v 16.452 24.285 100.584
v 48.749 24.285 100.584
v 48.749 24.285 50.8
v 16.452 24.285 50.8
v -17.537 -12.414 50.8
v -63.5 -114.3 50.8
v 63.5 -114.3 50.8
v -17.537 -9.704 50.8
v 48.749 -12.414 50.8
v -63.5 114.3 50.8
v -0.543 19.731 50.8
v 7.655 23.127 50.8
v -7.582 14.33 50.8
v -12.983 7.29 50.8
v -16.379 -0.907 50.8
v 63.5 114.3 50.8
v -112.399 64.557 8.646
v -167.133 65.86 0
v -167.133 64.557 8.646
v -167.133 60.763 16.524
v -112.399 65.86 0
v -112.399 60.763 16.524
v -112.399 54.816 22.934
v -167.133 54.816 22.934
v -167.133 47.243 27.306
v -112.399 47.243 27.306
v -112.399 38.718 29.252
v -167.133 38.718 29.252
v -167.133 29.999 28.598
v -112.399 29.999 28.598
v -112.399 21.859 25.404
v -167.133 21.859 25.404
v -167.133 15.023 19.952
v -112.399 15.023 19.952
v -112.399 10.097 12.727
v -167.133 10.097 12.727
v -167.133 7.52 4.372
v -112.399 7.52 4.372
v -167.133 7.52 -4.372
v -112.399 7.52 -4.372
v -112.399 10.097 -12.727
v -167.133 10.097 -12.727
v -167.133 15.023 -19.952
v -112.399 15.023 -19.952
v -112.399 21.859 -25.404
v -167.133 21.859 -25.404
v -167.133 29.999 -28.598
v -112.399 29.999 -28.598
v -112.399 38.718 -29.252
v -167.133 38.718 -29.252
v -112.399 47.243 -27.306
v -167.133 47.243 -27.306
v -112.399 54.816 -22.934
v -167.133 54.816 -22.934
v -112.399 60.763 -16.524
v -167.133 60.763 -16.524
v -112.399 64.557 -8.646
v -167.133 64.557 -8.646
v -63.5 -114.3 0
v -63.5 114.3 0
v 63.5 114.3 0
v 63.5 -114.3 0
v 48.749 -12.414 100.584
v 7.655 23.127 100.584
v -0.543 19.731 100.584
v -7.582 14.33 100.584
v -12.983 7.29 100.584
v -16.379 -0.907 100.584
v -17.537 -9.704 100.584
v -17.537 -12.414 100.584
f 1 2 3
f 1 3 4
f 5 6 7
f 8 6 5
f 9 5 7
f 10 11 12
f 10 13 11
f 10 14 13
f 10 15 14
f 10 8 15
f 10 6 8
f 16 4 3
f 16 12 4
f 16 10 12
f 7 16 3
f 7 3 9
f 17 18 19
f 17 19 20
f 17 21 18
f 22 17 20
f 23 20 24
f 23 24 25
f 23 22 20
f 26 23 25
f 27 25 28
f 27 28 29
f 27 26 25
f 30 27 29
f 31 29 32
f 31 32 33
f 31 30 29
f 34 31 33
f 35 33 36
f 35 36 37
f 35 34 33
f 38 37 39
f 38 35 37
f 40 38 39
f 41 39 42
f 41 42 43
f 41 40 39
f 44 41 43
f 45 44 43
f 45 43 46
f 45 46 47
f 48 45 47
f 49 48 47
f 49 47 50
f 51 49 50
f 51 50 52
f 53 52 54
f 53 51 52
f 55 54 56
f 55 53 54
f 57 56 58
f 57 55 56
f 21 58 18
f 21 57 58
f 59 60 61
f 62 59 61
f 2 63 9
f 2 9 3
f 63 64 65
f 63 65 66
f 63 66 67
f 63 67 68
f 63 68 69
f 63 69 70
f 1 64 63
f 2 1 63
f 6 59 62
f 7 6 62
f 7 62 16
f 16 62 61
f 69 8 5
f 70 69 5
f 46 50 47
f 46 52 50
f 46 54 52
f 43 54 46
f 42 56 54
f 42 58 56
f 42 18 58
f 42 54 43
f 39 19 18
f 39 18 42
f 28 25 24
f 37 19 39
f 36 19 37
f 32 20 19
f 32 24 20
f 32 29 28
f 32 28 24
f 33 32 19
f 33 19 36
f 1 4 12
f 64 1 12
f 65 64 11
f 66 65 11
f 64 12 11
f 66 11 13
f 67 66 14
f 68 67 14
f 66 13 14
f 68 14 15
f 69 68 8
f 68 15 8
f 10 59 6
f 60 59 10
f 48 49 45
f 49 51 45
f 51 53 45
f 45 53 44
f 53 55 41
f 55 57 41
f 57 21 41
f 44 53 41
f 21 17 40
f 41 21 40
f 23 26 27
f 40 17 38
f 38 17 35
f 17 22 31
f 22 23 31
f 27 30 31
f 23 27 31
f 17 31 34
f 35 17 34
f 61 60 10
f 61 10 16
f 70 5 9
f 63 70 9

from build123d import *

# Parameters (mm, degrees)
F0_W     = 127
F0_H     = 228.6
F1_DEPTH = 50.8
F2_W     = 29.3338634074
F2_H     = 29.3338634074
F4_DEPTH = 25.4
F6_DEPTH = 49.784


with BuildPart() as f1:
    # F0 (on Top) → F1 (new body)
    with BuildSketch(Plane.XY):
        Rectangle(F0_W, F0_H)
    extrude(amount=F1_DEPTH)

    # F5 (on face) → F6 (join)
    with BuildSketch(Plane.XY.offset(50.8)):
        with BuildLine():
            Line((48.7492531538, 24.2847409099), (16.4515623851, 24.2847409099))
            ThreePointArc((16.4515623851, 24.2847409099), (-7.5820488068, 14.3296932014), (-17.5370965153, -9.7039179905))
            Line((-17.5370965153, -9.7039179905), (-17.5370965153, -12.4137345701))
            Line((-17.5370965153, -12.4137345701), (48.7492531538, -12.4137345701))
            Line((48.7492531538, -12.4137345701), (48.7492531538, 24.2847409099))
        make_face()
    extrude(amount=F6_DEPTH)


with BuildPart() as f3:
    # F2 (on Top) → F3 (revolve)
    with BuildSketch(Plane.XY):
        with Locations((-127.0664017648, 51.193235442)):
            Rectangle(F2_W, F2_H)
    revolve(axis=Axis((-115.2426078916, 36.5263037384, 0), (1, 0, 0)))

    # F4 (add): a face of the model
    f4_faces = [f3.faces().sort_by_distance(p)[0] for p in [
        (-141.7333334684, 36.5263037384, 0),
    ]]
    extrude(f4_faces, amount=F4_DEPTH)


solid = Compound([f1.part, f3.part])
